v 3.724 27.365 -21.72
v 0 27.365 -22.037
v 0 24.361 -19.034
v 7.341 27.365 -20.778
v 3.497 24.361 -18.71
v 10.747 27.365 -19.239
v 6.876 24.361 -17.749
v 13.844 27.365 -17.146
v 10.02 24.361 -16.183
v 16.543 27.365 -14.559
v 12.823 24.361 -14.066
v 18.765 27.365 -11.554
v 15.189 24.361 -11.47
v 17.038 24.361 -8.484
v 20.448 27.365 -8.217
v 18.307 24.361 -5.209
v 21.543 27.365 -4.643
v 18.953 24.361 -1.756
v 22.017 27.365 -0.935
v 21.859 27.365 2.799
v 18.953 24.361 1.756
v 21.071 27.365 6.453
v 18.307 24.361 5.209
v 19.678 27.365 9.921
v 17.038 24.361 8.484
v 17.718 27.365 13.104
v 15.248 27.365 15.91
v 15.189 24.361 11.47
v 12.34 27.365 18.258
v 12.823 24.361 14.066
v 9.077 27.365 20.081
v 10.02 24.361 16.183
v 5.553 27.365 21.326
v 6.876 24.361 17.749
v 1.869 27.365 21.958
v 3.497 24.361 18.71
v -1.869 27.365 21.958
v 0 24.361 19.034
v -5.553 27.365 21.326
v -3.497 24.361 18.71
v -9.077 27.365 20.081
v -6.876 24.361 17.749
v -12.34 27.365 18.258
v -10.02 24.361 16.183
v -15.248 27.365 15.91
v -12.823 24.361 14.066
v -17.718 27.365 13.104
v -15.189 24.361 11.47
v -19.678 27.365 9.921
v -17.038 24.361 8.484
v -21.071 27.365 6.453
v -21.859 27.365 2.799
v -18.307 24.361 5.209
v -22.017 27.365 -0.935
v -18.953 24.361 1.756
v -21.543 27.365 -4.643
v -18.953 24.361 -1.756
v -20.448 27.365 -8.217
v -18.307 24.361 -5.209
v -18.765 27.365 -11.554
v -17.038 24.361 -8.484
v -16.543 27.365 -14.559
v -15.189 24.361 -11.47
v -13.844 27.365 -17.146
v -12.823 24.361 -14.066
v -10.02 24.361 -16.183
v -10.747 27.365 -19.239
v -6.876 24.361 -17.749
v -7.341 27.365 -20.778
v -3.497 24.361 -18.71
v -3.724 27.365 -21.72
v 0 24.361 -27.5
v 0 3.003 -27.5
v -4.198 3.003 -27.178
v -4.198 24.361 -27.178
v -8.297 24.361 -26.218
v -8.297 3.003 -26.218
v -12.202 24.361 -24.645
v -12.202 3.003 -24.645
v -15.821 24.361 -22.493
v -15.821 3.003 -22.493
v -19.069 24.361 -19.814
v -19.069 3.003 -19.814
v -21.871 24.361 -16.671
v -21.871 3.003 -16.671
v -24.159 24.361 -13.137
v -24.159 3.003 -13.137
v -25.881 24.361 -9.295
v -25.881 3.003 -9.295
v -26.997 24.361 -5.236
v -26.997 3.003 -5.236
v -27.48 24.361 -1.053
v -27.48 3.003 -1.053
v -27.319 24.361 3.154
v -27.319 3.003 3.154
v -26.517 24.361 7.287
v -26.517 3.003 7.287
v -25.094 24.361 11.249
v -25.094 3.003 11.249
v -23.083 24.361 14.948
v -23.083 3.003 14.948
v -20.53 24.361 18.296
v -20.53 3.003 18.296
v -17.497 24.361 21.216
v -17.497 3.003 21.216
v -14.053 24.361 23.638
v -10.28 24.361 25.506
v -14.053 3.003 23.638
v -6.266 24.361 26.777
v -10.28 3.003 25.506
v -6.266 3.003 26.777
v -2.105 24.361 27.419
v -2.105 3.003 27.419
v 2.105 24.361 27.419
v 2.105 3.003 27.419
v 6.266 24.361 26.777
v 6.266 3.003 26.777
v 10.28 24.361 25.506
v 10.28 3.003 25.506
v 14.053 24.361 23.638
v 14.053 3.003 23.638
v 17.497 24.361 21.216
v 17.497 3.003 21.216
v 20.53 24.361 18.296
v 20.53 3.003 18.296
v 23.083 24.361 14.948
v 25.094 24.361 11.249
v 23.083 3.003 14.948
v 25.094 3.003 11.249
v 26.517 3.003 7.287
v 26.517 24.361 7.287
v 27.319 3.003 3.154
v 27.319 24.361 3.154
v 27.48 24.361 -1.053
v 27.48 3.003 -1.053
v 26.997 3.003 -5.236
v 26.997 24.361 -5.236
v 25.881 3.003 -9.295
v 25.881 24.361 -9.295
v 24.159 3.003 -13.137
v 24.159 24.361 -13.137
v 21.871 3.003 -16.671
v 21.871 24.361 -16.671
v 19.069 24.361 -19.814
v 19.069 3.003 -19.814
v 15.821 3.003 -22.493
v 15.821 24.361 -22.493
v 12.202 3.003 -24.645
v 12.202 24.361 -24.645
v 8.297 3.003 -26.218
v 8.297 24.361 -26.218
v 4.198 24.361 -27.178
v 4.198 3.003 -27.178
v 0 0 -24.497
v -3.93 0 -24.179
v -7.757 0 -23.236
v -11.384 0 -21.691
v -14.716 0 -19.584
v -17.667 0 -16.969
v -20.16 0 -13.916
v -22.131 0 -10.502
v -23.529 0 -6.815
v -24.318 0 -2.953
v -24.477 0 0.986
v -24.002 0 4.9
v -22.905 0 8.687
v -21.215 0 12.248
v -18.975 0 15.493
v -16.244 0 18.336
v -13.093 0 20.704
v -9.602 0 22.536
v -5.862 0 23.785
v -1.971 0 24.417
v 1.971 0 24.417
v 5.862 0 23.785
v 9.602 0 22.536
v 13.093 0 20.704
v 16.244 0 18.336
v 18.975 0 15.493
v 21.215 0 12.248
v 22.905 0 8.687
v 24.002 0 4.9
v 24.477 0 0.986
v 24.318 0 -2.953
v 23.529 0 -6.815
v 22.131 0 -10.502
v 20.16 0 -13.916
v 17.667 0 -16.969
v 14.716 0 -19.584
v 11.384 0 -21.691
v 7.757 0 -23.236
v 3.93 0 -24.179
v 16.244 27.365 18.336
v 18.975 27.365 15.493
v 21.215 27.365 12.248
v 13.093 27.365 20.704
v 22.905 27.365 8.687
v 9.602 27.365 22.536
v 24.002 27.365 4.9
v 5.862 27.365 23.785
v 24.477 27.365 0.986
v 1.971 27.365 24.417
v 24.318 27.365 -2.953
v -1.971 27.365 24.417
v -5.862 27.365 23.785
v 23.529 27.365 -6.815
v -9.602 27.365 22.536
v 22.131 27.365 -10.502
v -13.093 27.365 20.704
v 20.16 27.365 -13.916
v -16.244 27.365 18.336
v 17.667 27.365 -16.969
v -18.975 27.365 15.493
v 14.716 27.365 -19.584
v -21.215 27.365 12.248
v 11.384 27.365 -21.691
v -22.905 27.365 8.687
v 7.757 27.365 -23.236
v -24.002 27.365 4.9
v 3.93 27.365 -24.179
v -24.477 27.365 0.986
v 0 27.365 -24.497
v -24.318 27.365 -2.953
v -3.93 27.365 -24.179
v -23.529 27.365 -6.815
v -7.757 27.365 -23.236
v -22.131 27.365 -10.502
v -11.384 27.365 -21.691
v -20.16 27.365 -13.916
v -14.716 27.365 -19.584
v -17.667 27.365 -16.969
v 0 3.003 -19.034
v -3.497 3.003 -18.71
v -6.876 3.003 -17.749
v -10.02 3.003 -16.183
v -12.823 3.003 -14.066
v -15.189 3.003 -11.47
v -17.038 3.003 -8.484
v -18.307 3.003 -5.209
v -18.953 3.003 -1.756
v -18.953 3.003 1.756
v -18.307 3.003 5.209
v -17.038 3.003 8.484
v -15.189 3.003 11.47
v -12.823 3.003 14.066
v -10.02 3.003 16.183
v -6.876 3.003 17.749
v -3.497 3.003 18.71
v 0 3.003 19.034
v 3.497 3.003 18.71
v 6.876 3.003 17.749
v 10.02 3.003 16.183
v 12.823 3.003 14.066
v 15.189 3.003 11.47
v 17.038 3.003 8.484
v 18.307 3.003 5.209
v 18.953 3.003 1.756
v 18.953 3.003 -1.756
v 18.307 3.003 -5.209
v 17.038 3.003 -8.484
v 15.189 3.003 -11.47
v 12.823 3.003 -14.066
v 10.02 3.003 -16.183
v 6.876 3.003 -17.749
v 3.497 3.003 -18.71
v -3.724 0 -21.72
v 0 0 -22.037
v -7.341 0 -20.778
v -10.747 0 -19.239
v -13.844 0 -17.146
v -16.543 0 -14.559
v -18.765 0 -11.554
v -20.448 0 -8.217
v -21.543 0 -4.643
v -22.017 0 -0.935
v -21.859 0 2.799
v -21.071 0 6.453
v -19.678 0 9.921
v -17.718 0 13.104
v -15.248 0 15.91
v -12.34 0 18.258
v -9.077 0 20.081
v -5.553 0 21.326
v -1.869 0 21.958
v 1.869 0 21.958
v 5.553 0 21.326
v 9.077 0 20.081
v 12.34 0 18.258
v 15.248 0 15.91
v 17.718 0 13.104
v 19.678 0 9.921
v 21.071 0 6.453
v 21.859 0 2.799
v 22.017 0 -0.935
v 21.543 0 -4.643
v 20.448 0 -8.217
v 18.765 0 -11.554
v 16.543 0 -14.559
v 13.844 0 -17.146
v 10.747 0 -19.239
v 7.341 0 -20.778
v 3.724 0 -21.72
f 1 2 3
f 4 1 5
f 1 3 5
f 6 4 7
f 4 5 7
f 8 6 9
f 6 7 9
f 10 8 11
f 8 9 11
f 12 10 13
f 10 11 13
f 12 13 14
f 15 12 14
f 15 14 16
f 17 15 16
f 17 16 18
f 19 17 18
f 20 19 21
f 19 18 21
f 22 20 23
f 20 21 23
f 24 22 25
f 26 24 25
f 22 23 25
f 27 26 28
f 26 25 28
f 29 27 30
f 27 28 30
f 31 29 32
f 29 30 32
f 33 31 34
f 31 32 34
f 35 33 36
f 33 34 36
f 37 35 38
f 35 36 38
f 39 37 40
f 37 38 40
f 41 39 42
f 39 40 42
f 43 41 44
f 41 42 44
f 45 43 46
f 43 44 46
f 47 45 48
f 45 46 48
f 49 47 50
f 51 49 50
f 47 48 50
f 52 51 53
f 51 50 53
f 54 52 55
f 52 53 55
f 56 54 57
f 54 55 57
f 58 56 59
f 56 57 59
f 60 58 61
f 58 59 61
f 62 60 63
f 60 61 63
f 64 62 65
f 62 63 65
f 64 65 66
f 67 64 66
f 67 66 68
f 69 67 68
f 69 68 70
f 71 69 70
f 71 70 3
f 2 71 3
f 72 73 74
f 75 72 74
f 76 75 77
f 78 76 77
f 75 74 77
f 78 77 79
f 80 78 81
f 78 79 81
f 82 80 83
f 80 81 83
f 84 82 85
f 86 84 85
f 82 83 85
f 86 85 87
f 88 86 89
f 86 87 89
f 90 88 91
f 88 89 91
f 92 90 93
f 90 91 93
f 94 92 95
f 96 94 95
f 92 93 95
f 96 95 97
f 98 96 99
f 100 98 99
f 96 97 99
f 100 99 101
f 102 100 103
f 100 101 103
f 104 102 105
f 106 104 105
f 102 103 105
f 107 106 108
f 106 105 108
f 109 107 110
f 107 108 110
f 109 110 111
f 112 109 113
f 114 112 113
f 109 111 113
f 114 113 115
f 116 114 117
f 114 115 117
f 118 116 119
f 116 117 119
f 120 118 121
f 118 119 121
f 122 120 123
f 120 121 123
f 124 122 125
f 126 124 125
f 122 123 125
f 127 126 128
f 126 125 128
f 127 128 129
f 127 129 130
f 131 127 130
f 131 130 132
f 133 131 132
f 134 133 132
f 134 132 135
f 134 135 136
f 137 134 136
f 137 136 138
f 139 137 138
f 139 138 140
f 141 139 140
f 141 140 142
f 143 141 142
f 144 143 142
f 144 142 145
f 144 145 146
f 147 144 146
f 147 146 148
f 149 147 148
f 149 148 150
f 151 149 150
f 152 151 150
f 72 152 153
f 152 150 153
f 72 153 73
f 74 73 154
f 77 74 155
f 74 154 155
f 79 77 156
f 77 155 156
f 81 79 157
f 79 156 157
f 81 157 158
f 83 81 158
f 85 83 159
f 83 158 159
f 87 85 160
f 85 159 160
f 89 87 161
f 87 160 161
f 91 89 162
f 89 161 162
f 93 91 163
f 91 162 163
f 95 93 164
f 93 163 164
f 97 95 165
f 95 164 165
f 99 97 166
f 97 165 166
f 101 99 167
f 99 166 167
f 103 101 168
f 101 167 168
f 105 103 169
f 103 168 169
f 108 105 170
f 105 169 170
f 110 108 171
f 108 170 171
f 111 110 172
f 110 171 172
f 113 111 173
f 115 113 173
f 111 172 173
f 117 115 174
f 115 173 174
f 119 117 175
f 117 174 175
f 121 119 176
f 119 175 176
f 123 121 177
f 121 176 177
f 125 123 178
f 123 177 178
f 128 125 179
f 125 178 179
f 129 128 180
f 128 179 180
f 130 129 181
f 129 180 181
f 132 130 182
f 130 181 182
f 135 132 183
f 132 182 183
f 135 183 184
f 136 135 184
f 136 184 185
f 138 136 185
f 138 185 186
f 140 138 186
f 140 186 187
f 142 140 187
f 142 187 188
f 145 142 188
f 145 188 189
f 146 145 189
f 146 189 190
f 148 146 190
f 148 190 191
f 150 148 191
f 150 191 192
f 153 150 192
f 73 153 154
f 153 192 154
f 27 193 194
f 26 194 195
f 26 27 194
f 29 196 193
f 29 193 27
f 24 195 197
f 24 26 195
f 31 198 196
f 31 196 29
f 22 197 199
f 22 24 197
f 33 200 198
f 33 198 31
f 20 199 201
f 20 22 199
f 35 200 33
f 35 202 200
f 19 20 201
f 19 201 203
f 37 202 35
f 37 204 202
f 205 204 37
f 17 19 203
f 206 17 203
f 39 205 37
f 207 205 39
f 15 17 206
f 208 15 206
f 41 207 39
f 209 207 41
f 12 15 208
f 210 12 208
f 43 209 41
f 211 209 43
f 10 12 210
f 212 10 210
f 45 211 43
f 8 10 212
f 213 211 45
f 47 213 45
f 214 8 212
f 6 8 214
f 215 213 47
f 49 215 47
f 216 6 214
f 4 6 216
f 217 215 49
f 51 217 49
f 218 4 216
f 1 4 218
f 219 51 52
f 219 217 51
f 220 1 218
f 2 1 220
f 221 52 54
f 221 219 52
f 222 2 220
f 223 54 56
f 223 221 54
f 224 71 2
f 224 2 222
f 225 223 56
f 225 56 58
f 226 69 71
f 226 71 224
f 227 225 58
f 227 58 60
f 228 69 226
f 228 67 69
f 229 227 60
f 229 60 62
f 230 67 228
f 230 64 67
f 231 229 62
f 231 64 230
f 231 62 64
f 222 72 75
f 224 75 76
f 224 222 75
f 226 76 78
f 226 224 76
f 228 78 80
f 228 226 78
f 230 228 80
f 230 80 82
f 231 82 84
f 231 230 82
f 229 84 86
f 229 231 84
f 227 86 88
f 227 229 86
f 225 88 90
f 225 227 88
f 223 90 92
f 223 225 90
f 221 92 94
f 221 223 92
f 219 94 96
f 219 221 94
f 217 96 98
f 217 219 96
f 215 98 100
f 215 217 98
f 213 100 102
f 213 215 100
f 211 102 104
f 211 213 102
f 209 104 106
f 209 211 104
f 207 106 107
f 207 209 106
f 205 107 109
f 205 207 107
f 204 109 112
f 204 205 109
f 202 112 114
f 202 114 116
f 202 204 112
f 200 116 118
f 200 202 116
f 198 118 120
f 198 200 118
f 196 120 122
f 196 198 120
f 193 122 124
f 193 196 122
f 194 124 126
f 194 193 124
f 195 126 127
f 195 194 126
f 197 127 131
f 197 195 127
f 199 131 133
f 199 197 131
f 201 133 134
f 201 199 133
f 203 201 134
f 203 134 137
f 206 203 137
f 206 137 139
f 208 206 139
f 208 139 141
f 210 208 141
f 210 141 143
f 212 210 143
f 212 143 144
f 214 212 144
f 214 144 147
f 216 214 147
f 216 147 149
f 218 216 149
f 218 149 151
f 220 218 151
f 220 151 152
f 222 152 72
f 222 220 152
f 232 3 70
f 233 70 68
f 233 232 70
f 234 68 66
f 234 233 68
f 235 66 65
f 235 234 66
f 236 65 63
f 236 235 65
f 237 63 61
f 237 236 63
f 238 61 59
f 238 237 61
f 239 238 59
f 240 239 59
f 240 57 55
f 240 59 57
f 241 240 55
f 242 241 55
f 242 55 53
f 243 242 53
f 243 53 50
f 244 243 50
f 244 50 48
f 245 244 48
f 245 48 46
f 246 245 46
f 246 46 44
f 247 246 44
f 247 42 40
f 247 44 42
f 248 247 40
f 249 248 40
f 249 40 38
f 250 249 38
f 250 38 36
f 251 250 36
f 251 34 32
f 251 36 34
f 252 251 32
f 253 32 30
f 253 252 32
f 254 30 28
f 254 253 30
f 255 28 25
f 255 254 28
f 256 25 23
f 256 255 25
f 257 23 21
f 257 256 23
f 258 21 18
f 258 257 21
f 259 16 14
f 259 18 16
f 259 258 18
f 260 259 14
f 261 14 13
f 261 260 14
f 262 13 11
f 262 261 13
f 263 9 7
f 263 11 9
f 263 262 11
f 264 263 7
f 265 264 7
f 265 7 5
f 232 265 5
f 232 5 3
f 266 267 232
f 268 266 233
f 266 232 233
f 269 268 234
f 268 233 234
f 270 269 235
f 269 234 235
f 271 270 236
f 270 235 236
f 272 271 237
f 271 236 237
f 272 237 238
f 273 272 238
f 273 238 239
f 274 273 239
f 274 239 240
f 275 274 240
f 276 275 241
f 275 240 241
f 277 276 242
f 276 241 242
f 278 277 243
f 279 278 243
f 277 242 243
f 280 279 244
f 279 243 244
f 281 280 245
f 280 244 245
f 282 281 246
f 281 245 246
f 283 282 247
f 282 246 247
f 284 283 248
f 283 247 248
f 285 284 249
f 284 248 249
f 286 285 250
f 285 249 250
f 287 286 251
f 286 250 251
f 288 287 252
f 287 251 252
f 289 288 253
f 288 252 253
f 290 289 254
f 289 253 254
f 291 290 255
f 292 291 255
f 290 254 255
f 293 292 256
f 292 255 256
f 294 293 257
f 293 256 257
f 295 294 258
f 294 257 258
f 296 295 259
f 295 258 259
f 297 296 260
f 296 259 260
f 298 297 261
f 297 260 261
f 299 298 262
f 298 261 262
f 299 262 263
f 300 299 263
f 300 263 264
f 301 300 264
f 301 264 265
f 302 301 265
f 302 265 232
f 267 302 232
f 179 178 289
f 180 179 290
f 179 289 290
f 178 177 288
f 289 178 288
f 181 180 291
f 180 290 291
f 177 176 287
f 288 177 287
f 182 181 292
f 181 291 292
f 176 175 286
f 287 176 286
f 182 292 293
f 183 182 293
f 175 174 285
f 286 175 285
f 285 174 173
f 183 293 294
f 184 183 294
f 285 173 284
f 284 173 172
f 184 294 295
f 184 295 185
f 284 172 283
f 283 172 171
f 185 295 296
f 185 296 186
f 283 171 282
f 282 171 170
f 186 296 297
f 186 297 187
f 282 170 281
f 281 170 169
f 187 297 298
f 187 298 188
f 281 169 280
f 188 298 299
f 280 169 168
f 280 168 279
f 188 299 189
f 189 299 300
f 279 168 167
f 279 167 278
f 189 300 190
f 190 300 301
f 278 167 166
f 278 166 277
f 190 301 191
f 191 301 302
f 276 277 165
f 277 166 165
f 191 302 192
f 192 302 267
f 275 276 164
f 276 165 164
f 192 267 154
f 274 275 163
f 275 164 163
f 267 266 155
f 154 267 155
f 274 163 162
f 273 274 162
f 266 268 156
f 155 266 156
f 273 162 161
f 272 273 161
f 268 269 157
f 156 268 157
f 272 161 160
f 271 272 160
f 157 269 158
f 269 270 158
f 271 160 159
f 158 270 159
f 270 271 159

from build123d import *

# Parameters (mm, degrees)
SKETCH1_R           = 27.5
BOSS_EXTRUDE1_DEPTH = 27.364675875
SKETCH2_R           = 19.033814865
CUT_EXTRUDE1_DEPTH  = 48.553396154
CHAMFER1_SIZE       = 3.003375326


with BuildPart() as part:
    # Sketch1 → Boss-Extrude1 (new body)
    with BuildSketch(Plane(origin=(0, 0, 0), x_dir=(1, 0, 0), z_dir=(0, 1, 0))):
        Circle(SKETCH1_R)
    extrude(amount=BOSS_EXTRUDE1_DEPTH)

    # Sketch2 → Cut-Extrude1 (cut, through all)
    with BuildSketch(Plane(origin=(0, 0, 0), x_dir=(1, 0, 0), z_dir=(0, 1, 0))):
        Circle(SKETCH2_R)
    extrude(amount=CUT_EXTRUDE1_DEPTH, mode=Mode.SUBTRACT)

    # Chamfer1
    chamfer1_edges = [part.edges().sort_by_distance(p)[0] for p in [
        (-19.033814865, 27.364675875, 0),
        (-19.033814865, 0, 0),
        (-27.5, 0, 0),
        (-27.5, 27.364675875, 0),
    ]]
    chamfer(chamfer1_edges, length=CHAMFER1_SIZE)


solid = part.part
